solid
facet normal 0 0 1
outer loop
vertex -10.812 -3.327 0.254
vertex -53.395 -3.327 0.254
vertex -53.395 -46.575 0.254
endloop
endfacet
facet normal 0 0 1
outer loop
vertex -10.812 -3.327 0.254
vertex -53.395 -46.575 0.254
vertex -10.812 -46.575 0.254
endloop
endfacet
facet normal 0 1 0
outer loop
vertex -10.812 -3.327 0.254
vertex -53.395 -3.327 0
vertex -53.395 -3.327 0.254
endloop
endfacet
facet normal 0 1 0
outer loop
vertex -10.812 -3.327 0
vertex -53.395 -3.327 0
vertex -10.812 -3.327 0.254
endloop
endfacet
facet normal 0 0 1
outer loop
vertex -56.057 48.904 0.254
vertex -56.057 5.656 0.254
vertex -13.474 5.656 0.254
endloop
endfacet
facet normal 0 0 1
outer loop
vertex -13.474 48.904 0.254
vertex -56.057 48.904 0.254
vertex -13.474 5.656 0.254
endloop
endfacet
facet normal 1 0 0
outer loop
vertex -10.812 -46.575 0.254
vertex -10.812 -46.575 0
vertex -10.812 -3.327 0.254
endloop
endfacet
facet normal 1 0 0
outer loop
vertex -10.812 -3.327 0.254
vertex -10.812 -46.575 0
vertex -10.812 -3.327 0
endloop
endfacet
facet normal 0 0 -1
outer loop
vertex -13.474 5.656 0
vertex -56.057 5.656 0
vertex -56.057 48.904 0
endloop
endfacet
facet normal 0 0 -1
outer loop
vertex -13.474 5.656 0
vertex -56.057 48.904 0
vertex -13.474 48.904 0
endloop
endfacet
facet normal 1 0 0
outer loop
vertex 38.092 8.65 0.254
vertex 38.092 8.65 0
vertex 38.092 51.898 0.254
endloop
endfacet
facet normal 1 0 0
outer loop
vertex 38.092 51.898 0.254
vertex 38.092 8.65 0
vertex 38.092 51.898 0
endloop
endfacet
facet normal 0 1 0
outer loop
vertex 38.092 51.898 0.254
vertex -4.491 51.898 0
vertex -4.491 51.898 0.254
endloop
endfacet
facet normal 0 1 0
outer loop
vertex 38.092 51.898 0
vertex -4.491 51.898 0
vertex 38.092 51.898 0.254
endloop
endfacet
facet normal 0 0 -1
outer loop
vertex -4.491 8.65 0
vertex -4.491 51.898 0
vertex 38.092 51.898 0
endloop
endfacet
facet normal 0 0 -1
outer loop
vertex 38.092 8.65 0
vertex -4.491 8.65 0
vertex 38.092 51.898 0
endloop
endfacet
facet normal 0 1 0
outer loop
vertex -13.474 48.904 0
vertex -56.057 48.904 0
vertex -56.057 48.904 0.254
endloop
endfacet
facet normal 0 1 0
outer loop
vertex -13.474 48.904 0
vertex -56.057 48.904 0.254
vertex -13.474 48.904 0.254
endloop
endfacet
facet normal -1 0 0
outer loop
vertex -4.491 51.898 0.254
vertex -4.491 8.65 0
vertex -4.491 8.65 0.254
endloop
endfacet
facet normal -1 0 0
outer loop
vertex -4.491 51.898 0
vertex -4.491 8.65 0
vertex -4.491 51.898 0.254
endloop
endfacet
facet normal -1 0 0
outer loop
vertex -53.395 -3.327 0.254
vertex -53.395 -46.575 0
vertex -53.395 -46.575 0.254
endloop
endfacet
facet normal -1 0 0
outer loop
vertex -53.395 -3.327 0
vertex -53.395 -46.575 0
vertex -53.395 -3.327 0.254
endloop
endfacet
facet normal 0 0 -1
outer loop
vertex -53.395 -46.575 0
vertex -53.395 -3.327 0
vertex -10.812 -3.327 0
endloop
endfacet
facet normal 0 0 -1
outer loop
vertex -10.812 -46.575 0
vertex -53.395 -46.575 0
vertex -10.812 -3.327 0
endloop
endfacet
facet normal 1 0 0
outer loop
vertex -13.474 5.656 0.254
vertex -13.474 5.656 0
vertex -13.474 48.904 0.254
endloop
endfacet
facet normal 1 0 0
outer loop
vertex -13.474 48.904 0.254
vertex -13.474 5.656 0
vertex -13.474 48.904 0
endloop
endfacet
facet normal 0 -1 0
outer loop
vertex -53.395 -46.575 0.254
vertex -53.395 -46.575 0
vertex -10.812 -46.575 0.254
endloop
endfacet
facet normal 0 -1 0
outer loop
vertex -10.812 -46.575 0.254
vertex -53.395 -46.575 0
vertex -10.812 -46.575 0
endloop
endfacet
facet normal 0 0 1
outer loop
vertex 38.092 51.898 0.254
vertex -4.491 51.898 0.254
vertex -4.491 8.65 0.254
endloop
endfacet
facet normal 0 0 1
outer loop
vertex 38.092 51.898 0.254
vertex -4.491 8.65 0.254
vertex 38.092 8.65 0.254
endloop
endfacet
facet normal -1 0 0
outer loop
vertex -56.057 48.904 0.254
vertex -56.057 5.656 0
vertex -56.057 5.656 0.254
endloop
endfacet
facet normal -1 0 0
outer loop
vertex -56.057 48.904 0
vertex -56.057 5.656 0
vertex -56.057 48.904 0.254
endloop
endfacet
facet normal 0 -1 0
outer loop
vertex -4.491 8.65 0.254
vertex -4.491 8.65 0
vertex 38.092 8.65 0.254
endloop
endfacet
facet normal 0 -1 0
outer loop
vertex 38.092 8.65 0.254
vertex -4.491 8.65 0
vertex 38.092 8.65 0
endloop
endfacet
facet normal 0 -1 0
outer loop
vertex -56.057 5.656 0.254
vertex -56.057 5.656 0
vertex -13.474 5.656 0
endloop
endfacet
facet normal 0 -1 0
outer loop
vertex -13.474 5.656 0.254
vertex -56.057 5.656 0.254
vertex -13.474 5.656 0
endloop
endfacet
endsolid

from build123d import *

# Parameters (mm, degrees)
F0_W     = 42.583288
F0_H     = 43.248649
F1_DEPTH = 0.254
F0_W_2   = 42.583289
F0_H_2   = 43.248648
F2_DEPTH = 0.254


with BuildPart() as f1:
    # F0 (on Top) → F1 (new body)
    with BuildSketch(Plane.XY):
        with Locations((-34.765262, 27.279917)):
            Rectangle(F0_W, F0_H)
    extrude(amount=F1_DEPTH)

    # F0 (on Top) → F2 (join)
    with BuildSketch(Plane.XY):
        with Locations((-34.765262, 27.279917)):
            Rectangle(F0_W, F0_H)
        with Locations((16.800435, 30.274056)):
            Rectangle(F0_W_2, F0_H_2)
        with Locations((-32.103806, -24.951144)):
            Rectangle(F0_W_2, F0_H)
    extrude(amount=F2_DEPTH)


solid = f1.part
